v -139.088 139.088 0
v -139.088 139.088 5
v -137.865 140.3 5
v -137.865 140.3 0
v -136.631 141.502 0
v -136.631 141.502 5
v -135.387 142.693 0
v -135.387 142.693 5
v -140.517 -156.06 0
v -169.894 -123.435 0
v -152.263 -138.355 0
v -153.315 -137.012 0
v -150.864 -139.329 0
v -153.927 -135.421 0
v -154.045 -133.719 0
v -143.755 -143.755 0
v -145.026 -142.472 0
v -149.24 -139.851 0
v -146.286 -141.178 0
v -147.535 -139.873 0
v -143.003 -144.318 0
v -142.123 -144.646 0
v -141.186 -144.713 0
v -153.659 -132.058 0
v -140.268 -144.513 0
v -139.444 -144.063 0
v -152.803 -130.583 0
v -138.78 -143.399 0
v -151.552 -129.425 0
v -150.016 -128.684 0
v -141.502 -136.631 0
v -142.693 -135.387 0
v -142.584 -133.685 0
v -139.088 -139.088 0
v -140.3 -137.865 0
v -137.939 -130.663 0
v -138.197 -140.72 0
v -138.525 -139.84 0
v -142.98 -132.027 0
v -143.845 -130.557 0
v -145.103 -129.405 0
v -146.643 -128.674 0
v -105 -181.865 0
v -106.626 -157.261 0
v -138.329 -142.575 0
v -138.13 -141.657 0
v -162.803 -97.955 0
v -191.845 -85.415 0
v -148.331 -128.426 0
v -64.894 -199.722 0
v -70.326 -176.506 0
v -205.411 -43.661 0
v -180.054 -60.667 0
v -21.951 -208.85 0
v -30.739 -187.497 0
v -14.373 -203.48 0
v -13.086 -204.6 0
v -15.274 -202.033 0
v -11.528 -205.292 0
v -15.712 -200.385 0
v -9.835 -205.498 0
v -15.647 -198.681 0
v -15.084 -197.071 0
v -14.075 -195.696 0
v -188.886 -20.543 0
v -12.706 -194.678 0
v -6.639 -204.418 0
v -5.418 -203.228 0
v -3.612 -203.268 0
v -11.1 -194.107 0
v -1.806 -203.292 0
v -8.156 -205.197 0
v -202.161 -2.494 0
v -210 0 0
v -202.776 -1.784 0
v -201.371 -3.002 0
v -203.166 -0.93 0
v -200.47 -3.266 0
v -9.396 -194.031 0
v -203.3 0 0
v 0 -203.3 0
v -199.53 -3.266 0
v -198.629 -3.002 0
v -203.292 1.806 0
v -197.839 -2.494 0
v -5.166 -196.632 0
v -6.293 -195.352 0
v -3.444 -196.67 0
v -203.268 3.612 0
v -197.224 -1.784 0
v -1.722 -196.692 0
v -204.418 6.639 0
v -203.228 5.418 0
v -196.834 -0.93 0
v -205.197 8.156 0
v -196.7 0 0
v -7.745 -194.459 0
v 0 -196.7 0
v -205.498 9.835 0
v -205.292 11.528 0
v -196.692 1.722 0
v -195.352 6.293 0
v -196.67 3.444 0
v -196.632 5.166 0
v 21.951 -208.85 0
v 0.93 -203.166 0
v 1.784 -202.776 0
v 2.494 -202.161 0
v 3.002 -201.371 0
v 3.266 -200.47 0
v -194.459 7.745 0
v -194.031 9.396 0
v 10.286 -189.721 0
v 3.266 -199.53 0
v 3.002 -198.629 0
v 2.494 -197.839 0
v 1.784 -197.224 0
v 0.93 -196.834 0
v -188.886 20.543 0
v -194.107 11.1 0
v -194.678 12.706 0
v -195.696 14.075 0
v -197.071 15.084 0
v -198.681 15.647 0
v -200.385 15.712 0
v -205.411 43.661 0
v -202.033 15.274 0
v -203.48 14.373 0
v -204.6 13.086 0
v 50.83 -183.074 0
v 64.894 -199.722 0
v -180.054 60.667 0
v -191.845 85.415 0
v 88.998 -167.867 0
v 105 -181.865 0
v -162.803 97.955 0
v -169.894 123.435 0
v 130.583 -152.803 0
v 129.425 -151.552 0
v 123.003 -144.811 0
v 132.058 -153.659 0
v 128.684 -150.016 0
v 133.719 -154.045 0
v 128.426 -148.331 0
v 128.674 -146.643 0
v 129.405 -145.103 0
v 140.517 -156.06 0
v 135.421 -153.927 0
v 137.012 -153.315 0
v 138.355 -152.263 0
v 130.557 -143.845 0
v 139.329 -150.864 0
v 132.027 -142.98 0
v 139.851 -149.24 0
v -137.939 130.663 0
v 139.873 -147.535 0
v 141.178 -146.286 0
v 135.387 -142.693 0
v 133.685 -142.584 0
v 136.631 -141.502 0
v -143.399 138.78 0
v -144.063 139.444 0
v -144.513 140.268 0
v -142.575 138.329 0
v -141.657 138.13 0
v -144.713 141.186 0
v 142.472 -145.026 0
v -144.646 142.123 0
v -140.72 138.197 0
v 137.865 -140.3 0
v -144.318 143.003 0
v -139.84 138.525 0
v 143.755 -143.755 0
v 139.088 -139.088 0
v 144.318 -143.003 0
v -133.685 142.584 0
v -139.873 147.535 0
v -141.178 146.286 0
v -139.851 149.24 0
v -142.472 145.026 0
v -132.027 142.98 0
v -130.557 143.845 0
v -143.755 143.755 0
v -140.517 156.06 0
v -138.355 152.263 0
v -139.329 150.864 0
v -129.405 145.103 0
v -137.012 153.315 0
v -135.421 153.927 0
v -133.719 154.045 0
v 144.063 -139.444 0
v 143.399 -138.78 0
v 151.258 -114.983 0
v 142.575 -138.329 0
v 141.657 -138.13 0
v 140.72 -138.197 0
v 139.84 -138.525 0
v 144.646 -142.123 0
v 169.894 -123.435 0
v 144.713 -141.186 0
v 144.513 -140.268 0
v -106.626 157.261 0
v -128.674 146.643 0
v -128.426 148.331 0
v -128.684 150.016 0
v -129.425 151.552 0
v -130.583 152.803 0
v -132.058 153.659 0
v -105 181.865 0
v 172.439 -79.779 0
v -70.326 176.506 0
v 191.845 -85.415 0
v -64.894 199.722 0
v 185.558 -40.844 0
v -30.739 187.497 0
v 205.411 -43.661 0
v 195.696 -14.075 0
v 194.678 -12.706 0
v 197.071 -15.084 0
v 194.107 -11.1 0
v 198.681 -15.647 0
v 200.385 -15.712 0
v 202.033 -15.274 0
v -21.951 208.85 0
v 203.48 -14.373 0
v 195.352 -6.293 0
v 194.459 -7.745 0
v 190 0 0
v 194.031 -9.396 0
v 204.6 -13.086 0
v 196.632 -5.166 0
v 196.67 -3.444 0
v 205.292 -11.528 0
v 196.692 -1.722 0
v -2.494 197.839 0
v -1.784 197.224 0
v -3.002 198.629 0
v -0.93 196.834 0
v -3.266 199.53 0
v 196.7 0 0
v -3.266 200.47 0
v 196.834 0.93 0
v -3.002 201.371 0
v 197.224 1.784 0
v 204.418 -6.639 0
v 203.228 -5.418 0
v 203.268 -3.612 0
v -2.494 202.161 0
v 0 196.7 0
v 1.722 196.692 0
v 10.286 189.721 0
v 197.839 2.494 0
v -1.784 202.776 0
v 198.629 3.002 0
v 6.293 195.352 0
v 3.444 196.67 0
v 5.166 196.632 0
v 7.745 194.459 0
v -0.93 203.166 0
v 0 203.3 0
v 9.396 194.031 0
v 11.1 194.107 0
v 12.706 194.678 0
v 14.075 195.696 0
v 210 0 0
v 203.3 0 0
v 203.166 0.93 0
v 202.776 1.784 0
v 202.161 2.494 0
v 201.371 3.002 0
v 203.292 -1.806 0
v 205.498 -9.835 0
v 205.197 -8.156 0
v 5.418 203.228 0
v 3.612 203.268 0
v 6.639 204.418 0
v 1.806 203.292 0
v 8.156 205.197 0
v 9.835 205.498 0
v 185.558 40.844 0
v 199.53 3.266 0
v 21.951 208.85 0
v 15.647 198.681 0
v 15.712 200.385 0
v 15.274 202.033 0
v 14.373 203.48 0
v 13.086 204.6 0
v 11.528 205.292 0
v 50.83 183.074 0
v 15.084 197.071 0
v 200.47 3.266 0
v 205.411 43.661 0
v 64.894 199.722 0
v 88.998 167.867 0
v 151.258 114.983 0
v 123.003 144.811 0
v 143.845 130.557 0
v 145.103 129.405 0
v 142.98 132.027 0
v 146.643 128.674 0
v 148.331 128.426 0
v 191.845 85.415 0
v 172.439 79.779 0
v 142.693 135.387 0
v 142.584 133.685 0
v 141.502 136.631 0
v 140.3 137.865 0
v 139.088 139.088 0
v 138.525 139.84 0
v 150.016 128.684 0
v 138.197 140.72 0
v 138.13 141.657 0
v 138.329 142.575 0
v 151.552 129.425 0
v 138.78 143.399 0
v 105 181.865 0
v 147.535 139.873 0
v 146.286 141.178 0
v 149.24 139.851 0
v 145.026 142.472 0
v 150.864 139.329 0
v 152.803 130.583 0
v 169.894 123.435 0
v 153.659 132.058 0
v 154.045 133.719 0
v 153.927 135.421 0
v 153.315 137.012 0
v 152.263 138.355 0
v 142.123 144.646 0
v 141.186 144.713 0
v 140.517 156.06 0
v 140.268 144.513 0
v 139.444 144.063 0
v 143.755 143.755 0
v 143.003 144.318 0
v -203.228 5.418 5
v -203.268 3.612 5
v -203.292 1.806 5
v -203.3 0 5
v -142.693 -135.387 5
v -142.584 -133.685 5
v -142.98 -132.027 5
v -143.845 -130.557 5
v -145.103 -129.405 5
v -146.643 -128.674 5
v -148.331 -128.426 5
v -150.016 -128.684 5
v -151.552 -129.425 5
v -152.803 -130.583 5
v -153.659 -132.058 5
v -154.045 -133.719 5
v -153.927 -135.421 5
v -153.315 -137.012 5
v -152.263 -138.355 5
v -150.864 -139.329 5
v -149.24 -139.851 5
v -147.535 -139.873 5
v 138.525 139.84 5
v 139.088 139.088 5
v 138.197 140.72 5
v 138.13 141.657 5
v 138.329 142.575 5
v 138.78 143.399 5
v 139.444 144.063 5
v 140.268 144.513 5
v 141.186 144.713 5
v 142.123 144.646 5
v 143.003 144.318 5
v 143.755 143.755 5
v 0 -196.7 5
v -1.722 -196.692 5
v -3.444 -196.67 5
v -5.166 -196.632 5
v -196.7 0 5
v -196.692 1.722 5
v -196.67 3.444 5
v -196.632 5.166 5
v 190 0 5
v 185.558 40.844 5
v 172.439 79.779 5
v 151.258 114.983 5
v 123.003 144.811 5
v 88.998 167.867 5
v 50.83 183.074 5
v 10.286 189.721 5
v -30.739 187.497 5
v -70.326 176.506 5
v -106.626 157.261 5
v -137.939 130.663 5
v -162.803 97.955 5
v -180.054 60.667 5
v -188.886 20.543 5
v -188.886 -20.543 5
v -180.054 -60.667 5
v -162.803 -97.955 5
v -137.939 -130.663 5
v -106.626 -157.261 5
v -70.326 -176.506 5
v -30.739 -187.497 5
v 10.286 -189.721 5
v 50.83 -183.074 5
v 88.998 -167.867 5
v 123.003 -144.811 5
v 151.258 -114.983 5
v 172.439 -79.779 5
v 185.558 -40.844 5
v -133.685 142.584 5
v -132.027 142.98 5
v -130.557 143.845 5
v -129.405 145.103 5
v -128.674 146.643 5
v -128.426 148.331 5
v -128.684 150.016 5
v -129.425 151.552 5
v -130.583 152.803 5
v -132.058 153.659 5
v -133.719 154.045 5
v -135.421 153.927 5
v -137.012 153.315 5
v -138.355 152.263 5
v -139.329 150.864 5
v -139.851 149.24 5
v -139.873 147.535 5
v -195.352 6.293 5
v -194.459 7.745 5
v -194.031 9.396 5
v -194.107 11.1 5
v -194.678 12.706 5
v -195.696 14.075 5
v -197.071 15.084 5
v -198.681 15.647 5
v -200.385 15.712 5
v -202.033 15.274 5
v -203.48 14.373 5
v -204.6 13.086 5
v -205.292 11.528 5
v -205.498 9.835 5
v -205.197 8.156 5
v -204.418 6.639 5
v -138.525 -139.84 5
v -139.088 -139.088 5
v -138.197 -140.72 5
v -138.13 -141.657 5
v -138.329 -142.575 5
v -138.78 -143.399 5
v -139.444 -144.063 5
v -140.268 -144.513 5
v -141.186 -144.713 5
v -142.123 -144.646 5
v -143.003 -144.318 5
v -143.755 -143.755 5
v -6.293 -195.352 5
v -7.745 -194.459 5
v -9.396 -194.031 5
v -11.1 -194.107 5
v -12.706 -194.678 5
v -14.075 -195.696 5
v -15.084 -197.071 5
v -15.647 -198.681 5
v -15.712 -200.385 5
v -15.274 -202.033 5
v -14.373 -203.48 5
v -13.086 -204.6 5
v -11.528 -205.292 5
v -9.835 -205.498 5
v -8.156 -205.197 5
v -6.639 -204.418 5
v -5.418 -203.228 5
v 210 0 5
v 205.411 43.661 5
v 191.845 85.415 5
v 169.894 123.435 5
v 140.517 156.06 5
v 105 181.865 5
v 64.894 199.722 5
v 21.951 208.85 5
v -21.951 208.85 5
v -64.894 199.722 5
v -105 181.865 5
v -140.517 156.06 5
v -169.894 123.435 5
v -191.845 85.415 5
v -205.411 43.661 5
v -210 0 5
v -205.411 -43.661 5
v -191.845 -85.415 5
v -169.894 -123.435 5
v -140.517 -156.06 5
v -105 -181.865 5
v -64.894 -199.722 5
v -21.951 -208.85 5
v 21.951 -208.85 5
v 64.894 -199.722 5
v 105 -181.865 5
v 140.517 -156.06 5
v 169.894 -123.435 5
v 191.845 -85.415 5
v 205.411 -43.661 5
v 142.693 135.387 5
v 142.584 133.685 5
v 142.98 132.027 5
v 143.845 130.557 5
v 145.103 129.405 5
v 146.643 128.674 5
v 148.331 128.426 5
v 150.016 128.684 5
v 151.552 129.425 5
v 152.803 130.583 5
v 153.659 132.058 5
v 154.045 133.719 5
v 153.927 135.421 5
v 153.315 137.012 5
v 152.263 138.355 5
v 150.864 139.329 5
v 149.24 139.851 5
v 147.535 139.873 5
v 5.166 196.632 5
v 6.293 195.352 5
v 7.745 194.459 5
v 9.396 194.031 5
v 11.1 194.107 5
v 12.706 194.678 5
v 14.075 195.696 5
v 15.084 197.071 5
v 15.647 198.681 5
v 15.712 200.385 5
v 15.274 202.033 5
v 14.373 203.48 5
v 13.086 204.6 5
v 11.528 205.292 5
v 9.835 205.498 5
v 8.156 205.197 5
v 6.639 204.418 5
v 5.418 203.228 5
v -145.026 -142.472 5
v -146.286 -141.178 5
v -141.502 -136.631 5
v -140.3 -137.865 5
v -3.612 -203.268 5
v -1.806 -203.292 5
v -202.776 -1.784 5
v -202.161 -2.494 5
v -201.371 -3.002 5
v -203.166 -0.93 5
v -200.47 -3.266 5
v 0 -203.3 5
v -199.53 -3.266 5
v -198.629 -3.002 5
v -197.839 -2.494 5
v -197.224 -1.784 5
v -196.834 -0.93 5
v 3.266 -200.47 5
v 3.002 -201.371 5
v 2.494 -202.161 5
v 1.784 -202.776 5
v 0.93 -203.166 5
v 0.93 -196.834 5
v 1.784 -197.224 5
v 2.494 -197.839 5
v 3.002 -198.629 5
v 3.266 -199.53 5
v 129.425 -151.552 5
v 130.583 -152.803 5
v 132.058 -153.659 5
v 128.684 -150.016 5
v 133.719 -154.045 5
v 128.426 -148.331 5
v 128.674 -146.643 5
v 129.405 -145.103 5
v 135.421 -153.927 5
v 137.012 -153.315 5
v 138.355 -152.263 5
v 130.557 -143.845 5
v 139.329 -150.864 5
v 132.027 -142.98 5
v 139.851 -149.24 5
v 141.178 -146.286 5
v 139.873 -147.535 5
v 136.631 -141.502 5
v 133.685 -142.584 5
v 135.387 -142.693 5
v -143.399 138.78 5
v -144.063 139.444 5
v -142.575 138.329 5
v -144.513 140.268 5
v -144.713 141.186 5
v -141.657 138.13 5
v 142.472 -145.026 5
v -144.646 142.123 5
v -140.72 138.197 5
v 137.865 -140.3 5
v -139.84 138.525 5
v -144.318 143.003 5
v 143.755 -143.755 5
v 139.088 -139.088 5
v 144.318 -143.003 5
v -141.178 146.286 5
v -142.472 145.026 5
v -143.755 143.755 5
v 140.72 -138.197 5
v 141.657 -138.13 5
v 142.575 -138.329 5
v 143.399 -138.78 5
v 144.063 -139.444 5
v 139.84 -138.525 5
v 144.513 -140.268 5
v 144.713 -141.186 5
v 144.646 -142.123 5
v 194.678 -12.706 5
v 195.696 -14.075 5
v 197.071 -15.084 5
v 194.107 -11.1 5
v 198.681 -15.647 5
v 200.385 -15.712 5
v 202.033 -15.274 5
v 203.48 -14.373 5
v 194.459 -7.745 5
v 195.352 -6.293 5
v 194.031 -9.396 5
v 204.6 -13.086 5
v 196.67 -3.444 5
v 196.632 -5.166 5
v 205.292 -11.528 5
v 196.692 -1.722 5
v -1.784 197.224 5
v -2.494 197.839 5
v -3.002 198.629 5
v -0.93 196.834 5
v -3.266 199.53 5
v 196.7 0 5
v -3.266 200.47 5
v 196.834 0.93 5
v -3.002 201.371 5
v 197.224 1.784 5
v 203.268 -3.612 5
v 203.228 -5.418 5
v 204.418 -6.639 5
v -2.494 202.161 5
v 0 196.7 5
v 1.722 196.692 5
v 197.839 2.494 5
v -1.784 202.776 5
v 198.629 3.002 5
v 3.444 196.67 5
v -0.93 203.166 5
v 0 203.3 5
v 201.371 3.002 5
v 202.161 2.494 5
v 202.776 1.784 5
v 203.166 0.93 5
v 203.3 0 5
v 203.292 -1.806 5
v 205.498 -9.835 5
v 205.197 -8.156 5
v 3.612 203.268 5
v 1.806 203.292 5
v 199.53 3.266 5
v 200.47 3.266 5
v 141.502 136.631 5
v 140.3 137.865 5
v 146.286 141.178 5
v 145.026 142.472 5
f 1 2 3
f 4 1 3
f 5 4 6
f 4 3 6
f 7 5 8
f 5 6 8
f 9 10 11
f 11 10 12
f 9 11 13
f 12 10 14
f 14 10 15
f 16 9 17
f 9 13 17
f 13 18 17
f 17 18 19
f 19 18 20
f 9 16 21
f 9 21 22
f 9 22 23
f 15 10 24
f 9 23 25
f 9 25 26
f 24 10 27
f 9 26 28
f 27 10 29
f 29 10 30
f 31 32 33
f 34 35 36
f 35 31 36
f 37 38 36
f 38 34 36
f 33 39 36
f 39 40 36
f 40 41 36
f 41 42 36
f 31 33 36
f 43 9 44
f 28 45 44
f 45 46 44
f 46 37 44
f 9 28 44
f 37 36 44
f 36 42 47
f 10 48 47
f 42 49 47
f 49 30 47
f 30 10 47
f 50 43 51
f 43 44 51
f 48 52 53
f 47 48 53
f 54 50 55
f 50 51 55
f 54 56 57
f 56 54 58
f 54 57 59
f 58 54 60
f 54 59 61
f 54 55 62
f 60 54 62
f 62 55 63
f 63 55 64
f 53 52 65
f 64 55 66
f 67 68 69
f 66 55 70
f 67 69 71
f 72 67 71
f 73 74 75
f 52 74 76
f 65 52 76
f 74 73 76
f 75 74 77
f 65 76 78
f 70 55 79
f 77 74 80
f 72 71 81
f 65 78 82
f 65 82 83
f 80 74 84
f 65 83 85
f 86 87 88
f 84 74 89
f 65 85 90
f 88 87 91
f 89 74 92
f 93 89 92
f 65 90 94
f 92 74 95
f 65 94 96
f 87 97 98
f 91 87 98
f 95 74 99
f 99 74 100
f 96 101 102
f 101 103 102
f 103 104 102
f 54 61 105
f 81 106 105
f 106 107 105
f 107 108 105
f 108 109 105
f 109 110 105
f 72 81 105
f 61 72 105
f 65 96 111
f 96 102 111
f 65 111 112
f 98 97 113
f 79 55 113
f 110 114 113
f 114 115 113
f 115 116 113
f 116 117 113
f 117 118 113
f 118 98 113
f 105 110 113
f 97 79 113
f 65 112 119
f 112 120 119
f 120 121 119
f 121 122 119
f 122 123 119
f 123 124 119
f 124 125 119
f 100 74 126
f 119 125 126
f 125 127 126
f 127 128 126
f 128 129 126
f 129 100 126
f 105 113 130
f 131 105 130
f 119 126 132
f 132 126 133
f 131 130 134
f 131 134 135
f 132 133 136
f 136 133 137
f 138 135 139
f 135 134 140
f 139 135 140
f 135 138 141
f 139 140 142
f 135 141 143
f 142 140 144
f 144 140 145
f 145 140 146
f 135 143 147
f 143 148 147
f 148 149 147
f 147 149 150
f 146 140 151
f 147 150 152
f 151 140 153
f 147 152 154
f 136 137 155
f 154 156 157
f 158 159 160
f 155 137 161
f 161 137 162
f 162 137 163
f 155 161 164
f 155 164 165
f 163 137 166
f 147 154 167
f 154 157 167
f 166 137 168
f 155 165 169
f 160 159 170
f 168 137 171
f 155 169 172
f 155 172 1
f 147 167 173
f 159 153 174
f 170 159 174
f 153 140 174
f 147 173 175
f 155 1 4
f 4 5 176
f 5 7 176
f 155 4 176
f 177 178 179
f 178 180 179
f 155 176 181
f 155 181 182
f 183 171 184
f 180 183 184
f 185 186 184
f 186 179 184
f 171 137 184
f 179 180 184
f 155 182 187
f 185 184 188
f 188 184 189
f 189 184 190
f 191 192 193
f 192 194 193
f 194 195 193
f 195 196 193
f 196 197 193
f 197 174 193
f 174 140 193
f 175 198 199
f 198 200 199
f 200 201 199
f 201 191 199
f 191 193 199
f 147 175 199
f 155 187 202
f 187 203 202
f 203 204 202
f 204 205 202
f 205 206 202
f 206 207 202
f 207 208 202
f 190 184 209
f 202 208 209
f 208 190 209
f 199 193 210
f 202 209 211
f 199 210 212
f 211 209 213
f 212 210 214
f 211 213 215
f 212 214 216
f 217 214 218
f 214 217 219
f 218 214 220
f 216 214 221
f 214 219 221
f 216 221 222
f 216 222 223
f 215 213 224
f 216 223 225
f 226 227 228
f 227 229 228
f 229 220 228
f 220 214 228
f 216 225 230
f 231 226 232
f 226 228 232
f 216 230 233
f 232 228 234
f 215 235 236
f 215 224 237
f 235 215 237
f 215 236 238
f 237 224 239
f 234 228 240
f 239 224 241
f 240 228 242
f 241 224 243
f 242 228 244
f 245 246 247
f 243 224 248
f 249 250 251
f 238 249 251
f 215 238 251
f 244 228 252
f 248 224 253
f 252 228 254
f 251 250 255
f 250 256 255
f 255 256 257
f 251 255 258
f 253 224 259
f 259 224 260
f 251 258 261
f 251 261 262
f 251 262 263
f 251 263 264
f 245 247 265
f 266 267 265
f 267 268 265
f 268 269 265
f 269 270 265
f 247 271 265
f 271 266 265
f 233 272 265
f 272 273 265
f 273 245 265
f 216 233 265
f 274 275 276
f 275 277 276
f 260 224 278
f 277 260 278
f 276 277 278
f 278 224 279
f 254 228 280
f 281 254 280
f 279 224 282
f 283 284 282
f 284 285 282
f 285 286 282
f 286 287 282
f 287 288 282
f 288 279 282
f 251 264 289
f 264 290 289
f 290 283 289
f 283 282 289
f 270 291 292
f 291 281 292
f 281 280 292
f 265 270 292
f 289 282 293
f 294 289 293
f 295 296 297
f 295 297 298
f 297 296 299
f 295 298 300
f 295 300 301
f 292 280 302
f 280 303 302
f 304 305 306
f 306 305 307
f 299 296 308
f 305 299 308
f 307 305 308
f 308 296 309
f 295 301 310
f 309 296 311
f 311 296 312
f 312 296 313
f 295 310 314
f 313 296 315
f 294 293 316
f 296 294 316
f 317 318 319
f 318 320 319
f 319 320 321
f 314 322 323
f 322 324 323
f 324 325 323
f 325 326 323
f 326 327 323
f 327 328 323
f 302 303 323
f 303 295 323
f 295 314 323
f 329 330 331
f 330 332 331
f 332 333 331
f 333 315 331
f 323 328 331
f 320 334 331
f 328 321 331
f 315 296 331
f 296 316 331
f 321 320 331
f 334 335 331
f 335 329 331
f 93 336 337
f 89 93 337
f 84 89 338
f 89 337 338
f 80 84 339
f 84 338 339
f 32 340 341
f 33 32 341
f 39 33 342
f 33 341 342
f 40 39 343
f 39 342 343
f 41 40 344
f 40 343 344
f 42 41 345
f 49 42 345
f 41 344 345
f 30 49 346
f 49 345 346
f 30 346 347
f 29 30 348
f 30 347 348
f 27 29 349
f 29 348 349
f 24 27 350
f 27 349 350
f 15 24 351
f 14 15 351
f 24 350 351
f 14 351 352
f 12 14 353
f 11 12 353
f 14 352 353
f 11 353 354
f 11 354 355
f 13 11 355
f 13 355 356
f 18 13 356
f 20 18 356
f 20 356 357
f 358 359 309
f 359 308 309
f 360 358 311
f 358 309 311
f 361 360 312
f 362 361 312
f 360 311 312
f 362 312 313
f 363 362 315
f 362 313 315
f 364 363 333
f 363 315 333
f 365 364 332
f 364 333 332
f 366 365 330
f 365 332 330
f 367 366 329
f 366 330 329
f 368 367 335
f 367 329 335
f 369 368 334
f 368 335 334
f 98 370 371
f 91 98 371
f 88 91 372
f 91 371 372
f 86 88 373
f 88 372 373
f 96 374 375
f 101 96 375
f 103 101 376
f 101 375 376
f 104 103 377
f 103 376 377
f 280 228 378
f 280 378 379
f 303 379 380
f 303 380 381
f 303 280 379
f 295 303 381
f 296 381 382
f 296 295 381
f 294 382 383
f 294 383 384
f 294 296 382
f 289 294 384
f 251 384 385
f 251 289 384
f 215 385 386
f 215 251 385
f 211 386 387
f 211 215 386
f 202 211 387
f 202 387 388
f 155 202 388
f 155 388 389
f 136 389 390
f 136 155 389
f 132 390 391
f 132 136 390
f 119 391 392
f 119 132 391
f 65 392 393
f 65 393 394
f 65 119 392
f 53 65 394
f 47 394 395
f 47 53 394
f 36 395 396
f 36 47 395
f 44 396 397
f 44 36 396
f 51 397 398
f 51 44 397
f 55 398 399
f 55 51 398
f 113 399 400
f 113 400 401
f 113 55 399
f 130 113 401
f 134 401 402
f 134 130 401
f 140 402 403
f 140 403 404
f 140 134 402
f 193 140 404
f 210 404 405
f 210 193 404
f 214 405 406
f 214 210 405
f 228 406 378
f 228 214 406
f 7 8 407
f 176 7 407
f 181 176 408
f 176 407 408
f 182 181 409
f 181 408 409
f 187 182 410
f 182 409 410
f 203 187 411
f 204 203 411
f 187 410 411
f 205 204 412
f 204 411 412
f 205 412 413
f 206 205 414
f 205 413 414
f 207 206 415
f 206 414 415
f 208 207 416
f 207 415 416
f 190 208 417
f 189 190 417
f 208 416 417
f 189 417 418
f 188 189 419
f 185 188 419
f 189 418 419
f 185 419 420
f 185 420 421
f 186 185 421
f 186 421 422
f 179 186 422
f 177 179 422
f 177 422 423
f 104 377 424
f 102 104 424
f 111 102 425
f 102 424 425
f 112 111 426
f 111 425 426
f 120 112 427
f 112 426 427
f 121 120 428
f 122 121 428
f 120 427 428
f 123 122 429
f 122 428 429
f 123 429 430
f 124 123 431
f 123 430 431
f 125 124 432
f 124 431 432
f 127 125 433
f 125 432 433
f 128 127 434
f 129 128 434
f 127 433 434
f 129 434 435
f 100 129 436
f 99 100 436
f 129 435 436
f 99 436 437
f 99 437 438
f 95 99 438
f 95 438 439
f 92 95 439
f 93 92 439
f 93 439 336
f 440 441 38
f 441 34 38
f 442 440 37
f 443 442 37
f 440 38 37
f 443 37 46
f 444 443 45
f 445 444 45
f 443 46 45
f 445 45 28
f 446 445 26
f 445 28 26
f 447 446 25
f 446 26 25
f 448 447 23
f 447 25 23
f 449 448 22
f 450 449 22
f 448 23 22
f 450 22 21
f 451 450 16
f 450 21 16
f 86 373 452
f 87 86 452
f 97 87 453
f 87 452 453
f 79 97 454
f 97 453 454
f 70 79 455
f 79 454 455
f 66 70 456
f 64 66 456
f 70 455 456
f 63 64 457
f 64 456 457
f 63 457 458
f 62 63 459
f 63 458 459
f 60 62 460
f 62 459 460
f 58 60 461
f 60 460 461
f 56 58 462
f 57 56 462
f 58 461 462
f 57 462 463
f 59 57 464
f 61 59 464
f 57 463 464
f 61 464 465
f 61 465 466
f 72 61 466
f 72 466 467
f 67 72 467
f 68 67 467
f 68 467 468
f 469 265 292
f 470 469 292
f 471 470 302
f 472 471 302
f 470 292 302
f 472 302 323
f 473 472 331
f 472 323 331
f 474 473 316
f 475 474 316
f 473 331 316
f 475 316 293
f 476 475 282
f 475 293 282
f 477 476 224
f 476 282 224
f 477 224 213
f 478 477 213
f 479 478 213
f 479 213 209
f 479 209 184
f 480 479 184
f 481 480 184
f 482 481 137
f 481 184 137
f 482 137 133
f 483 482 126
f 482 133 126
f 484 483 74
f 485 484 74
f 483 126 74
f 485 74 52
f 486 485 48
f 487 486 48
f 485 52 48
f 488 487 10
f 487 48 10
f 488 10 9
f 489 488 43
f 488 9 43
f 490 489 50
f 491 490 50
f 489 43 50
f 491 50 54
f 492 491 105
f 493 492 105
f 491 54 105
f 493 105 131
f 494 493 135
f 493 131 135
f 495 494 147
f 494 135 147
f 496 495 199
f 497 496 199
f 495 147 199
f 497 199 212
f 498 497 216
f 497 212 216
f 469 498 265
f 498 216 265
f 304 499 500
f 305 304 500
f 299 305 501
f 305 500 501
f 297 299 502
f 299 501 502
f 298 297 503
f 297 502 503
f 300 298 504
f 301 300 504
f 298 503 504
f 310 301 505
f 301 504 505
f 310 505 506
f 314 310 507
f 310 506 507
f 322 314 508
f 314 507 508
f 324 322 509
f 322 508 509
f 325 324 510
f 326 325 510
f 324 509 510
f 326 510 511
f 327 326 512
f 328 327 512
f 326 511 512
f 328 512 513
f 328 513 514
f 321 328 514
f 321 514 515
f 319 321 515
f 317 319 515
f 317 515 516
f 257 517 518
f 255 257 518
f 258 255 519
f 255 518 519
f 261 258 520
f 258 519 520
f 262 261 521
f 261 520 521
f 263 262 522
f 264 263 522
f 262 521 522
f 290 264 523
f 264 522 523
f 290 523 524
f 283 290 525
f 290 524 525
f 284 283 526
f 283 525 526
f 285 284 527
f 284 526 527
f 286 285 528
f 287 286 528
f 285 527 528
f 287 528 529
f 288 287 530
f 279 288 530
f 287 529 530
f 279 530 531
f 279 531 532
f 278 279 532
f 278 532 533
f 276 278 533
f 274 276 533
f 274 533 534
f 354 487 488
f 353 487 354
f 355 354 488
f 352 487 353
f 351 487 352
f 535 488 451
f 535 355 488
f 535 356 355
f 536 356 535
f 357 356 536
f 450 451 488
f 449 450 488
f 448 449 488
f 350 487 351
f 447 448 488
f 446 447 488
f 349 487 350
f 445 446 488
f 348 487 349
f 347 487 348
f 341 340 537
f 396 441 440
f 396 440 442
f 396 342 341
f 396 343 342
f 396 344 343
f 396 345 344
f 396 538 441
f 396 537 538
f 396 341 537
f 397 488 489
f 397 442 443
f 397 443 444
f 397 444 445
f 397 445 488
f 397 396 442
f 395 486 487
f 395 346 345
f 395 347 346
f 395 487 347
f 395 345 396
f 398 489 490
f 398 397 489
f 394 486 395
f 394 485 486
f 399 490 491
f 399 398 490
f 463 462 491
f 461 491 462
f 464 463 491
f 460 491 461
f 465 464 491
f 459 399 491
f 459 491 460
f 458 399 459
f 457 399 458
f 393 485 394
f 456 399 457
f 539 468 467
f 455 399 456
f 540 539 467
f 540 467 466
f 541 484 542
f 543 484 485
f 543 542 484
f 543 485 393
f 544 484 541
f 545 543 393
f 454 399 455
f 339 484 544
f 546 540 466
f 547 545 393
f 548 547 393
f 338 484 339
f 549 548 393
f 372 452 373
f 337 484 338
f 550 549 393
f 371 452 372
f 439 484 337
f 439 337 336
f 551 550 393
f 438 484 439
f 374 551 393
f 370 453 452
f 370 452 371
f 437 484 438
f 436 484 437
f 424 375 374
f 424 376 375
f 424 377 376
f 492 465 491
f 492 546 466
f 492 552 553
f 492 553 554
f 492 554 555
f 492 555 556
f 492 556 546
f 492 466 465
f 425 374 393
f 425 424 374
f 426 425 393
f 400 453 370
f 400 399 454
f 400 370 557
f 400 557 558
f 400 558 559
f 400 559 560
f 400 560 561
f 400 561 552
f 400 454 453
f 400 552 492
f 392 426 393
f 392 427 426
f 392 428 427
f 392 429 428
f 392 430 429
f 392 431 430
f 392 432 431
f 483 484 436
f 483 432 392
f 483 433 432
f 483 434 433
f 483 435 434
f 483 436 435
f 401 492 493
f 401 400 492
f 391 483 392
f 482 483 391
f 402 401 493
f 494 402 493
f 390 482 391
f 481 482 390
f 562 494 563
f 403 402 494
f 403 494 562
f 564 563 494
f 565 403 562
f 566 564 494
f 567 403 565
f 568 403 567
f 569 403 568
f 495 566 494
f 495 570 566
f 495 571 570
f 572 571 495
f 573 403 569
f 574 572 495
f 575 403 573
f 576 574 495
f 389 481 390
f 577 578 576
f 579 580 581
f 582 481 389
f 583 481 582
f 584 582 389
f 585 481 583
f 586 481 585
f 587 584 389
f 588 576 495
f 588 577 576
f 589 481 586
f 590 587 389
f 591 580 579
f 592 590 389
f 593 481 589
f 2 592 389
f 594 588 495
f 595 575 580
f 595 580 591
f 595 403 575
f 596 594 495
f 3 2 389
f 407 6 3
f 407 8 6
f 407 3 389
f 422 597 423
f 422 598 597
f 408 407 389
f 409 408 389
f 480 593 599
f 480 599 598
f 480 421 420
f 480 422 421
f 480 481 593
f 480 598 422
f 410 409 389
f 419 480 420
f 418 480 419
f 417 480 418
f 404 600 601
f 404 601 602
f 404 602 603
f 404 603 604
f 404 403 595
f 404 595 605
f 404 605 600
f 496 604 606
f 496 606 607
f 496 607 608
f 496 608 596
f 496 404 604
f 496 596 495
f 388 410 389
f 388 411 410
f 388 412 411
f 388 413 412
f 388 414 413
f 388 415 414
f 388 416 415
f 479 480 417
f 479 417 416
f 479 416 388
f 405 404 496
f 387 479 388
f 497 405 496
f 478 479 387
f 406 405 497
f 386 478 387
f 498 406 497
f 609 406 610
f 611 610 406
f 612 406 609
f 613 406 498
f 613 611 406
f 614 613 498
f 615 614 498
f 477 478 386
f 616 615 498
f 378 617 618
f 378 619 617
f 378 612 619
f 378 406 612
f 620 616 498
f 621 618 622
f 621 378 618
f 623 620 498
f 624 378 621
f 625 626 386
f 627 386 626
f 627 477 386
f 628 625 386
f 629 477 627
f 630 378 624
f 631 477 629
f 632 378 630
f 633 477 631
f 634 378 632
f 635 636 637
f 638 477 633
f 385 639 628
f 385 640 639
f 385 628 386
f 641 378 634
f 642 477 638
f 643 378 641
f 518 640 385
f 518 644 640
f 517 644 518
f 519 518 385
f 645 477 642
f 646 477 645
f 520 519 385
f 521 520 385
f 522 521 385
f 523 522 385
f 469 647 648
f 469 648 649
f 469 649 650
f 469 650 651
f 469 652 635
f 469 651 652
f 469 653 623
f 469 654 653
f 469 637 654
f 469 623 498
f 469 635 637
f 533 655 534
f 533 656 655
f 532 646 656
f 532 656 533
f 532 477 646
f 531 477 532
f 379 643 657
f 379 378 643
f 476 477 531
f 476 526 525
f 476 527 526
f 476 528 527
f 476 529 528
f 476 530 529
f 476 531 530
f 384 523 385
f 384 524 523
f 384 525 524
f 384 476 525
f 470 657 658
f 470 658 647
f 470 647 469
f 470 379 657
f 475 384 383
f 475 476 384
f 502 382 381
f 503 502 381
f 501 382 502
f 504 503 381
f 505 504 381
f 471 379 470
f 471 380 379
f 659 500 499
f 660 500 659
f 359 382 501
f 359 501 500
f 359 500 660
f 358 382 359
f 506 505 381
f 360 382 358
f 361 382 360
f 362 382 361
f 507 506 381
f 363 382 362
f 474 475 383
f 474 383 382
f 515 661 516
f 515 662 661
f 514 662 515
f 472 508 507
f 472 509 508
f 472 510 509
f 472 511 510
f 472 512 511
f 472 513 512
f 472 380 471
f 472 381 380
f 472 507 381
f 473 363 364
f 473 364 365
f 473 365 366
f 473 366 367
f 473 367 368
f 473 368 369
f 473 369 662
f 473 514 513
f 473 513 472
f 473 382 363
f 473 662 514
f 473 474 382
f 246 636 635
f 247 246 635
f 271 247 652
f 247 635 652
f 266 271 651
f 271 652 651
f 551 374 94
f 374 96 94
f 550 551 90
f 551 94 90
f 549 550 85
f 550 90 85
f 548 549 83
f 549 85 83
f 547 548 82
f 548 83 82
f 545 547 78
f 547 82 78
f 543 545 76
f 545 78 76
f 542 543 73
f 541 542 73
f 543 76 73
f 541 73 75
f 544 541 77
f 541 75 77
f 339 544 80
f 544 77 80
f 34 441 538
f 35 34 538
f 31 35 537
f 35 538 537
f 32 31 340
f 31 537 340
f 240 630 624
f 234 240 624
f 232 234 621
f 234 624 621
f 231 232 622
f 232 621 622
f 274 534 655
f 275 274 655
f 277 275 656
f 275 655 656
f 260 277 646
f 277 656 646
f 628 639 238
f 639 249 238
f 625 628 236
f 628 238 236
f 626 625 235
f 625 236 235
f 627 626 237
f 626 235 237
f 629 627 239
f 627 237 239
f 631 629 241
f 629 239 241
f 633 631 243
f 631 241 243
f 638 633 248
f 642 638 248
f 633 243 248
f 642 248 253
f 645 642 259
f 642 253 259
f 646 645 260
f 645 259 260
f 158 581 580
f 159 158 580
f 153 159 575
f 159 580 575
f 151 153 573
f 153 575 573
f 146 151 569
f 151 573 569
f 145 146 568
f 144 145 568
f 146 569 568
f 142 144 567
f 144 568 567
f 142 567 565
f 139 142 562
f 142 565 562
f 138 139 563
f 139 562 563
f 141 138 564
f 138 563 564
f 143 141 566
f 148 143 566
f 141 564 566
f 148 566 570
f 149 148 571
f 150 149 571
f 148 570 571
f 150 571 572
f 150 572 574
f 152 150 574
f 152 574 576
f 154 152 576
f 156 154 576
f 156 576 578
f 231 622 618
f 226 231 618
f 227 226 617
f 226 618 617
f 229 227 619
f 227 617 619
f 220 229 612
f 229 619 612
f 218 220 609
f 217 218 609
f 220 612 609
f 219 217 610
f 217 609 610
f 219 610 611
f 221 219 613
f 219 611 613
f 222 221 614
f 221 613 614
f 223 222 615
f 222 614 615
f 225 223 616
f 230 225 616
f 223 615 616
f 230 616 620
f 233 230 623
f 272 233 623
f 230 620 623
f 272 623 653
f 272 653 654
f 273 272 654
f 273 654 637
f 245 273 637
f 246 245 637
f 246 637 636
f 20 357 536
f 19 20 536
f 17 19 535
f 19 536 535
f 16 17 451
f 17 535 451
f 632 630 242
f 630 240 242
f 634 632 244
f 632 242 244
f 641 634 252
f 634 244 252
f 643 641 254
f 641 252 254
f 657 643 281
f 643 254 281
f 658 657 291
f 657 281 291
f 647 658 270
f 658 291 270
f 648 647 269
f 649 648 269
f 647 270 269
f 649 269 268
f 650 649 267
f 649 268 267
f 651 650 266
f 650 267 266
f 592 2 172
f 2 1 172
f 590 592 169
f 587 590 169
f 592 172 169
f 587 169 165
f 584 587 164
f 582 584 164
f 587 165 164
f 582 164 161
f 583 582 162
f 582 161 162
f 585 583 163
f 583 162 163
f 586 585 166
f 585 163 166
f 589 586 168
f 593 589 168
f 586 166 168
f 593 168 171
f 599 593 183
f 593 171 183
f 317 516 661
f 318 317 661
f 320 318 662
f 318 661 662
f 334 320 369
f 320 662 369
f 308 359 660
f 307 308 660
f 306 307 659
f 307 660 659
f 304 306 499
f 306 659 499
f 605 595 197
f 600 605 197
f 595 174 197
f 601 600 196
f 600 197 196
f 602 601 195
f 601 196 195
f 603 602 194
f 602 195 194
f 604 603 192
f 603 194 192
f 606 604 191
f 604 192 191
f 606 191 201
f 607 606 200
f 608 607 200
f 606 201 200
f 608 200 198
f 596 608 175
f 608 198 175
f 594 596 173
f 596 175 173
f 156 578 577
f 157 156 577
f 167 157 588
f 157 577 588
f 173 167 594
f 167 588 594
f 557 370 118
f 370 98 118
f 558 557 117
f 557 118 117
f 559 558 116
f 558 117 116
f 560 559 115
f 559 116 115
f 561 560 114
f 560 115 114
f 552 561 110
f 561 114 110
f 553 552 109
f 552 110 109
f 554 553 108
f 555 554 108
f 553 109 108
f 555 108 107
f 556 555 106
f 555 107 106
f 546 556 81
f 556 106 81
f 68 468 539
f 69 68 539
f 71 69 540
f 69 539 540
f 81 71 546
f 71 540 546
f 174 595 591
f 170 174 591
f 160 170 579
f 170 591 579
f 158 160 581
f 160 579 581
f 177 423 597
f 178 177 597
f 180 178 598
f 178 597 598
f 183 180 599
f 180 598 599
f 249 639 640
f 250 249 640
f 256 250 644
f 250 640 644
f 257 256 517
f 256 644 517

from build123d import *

# Parameters (mm, degrees)
SKETCH1_R            = 210
SKETCH1_R_2          = 190
BOSS_EXTRUDE1_DEPTH  = 5
M6_CLEARANCE_HOLE1_D = 6.6
CUT_EXTRUDE1_DEPTH   = 5
CIRPATTERN1_COUNT    = 8


with BuildPart() as part:
    # Sketch1 → Boss-Extrude1 (new body)
    with BuildSketch(Plane.XY):
        Circle(SKETCH1_R)
        Circle(SKETCH1_R_2, mode=Mode.SUBTRACT)
    extrude(amount=BOSS_EXTRUDE1_DEPTH)

    # M6 Clearance Hole1 (through all)
    with Locations(Plane.XY.offset(5)):
        with Locations((0, 200)):
            m6_clearance_hole1 = Hole(M6_CLEARANCE_HOLE1_D / 2)

    # Sketch4 → Cut-Extrude1 (cut)
    with BuildSketch(Plane.XY.offset(5)):
        with BuildLine():
            ThreePointArc((5.165561681, 196.632161592), (15.742672541, 199.530216011), (5.41785296, 203.227795514))
            ThreePointArc((5.41785296, 203.227795514), (2.709167039, 203.281948077), (0, 203.3))
            ThreePointArc((0, 203.3), (3.3, 200), (0, 196.7))
            ThreePointArc((0, 196.7), (2.583003558, 196.683039667), (5.165561681, 196.632161592))
        make_face()
    cut_extrude1 = extrude(amount=-CUT_EXTRUDE1_DEPTH, mode=Mode.SUBTRACT)

    # CirPattern1: M6 Clearance Hole1, Cut-Extrude1 ×8 about axis
    cirpattern1_axis = Axis((0, 0, 0), (0, 0, 1))
    for i in range(1, CIRPATTERN1_COUNT):
        add(m6_clearance_hole1.rotate(cirpattern1_axis, i * 360 / CIRPATTERN1_COUNT), mode=Mode.SUBTRACT)
        add(cut_extrude1.rotate(cirpattern1_axis, i * 360 / CIRPATTERN1_COUNT), mode=Mode.SUBTRACT)


solid = part.part
